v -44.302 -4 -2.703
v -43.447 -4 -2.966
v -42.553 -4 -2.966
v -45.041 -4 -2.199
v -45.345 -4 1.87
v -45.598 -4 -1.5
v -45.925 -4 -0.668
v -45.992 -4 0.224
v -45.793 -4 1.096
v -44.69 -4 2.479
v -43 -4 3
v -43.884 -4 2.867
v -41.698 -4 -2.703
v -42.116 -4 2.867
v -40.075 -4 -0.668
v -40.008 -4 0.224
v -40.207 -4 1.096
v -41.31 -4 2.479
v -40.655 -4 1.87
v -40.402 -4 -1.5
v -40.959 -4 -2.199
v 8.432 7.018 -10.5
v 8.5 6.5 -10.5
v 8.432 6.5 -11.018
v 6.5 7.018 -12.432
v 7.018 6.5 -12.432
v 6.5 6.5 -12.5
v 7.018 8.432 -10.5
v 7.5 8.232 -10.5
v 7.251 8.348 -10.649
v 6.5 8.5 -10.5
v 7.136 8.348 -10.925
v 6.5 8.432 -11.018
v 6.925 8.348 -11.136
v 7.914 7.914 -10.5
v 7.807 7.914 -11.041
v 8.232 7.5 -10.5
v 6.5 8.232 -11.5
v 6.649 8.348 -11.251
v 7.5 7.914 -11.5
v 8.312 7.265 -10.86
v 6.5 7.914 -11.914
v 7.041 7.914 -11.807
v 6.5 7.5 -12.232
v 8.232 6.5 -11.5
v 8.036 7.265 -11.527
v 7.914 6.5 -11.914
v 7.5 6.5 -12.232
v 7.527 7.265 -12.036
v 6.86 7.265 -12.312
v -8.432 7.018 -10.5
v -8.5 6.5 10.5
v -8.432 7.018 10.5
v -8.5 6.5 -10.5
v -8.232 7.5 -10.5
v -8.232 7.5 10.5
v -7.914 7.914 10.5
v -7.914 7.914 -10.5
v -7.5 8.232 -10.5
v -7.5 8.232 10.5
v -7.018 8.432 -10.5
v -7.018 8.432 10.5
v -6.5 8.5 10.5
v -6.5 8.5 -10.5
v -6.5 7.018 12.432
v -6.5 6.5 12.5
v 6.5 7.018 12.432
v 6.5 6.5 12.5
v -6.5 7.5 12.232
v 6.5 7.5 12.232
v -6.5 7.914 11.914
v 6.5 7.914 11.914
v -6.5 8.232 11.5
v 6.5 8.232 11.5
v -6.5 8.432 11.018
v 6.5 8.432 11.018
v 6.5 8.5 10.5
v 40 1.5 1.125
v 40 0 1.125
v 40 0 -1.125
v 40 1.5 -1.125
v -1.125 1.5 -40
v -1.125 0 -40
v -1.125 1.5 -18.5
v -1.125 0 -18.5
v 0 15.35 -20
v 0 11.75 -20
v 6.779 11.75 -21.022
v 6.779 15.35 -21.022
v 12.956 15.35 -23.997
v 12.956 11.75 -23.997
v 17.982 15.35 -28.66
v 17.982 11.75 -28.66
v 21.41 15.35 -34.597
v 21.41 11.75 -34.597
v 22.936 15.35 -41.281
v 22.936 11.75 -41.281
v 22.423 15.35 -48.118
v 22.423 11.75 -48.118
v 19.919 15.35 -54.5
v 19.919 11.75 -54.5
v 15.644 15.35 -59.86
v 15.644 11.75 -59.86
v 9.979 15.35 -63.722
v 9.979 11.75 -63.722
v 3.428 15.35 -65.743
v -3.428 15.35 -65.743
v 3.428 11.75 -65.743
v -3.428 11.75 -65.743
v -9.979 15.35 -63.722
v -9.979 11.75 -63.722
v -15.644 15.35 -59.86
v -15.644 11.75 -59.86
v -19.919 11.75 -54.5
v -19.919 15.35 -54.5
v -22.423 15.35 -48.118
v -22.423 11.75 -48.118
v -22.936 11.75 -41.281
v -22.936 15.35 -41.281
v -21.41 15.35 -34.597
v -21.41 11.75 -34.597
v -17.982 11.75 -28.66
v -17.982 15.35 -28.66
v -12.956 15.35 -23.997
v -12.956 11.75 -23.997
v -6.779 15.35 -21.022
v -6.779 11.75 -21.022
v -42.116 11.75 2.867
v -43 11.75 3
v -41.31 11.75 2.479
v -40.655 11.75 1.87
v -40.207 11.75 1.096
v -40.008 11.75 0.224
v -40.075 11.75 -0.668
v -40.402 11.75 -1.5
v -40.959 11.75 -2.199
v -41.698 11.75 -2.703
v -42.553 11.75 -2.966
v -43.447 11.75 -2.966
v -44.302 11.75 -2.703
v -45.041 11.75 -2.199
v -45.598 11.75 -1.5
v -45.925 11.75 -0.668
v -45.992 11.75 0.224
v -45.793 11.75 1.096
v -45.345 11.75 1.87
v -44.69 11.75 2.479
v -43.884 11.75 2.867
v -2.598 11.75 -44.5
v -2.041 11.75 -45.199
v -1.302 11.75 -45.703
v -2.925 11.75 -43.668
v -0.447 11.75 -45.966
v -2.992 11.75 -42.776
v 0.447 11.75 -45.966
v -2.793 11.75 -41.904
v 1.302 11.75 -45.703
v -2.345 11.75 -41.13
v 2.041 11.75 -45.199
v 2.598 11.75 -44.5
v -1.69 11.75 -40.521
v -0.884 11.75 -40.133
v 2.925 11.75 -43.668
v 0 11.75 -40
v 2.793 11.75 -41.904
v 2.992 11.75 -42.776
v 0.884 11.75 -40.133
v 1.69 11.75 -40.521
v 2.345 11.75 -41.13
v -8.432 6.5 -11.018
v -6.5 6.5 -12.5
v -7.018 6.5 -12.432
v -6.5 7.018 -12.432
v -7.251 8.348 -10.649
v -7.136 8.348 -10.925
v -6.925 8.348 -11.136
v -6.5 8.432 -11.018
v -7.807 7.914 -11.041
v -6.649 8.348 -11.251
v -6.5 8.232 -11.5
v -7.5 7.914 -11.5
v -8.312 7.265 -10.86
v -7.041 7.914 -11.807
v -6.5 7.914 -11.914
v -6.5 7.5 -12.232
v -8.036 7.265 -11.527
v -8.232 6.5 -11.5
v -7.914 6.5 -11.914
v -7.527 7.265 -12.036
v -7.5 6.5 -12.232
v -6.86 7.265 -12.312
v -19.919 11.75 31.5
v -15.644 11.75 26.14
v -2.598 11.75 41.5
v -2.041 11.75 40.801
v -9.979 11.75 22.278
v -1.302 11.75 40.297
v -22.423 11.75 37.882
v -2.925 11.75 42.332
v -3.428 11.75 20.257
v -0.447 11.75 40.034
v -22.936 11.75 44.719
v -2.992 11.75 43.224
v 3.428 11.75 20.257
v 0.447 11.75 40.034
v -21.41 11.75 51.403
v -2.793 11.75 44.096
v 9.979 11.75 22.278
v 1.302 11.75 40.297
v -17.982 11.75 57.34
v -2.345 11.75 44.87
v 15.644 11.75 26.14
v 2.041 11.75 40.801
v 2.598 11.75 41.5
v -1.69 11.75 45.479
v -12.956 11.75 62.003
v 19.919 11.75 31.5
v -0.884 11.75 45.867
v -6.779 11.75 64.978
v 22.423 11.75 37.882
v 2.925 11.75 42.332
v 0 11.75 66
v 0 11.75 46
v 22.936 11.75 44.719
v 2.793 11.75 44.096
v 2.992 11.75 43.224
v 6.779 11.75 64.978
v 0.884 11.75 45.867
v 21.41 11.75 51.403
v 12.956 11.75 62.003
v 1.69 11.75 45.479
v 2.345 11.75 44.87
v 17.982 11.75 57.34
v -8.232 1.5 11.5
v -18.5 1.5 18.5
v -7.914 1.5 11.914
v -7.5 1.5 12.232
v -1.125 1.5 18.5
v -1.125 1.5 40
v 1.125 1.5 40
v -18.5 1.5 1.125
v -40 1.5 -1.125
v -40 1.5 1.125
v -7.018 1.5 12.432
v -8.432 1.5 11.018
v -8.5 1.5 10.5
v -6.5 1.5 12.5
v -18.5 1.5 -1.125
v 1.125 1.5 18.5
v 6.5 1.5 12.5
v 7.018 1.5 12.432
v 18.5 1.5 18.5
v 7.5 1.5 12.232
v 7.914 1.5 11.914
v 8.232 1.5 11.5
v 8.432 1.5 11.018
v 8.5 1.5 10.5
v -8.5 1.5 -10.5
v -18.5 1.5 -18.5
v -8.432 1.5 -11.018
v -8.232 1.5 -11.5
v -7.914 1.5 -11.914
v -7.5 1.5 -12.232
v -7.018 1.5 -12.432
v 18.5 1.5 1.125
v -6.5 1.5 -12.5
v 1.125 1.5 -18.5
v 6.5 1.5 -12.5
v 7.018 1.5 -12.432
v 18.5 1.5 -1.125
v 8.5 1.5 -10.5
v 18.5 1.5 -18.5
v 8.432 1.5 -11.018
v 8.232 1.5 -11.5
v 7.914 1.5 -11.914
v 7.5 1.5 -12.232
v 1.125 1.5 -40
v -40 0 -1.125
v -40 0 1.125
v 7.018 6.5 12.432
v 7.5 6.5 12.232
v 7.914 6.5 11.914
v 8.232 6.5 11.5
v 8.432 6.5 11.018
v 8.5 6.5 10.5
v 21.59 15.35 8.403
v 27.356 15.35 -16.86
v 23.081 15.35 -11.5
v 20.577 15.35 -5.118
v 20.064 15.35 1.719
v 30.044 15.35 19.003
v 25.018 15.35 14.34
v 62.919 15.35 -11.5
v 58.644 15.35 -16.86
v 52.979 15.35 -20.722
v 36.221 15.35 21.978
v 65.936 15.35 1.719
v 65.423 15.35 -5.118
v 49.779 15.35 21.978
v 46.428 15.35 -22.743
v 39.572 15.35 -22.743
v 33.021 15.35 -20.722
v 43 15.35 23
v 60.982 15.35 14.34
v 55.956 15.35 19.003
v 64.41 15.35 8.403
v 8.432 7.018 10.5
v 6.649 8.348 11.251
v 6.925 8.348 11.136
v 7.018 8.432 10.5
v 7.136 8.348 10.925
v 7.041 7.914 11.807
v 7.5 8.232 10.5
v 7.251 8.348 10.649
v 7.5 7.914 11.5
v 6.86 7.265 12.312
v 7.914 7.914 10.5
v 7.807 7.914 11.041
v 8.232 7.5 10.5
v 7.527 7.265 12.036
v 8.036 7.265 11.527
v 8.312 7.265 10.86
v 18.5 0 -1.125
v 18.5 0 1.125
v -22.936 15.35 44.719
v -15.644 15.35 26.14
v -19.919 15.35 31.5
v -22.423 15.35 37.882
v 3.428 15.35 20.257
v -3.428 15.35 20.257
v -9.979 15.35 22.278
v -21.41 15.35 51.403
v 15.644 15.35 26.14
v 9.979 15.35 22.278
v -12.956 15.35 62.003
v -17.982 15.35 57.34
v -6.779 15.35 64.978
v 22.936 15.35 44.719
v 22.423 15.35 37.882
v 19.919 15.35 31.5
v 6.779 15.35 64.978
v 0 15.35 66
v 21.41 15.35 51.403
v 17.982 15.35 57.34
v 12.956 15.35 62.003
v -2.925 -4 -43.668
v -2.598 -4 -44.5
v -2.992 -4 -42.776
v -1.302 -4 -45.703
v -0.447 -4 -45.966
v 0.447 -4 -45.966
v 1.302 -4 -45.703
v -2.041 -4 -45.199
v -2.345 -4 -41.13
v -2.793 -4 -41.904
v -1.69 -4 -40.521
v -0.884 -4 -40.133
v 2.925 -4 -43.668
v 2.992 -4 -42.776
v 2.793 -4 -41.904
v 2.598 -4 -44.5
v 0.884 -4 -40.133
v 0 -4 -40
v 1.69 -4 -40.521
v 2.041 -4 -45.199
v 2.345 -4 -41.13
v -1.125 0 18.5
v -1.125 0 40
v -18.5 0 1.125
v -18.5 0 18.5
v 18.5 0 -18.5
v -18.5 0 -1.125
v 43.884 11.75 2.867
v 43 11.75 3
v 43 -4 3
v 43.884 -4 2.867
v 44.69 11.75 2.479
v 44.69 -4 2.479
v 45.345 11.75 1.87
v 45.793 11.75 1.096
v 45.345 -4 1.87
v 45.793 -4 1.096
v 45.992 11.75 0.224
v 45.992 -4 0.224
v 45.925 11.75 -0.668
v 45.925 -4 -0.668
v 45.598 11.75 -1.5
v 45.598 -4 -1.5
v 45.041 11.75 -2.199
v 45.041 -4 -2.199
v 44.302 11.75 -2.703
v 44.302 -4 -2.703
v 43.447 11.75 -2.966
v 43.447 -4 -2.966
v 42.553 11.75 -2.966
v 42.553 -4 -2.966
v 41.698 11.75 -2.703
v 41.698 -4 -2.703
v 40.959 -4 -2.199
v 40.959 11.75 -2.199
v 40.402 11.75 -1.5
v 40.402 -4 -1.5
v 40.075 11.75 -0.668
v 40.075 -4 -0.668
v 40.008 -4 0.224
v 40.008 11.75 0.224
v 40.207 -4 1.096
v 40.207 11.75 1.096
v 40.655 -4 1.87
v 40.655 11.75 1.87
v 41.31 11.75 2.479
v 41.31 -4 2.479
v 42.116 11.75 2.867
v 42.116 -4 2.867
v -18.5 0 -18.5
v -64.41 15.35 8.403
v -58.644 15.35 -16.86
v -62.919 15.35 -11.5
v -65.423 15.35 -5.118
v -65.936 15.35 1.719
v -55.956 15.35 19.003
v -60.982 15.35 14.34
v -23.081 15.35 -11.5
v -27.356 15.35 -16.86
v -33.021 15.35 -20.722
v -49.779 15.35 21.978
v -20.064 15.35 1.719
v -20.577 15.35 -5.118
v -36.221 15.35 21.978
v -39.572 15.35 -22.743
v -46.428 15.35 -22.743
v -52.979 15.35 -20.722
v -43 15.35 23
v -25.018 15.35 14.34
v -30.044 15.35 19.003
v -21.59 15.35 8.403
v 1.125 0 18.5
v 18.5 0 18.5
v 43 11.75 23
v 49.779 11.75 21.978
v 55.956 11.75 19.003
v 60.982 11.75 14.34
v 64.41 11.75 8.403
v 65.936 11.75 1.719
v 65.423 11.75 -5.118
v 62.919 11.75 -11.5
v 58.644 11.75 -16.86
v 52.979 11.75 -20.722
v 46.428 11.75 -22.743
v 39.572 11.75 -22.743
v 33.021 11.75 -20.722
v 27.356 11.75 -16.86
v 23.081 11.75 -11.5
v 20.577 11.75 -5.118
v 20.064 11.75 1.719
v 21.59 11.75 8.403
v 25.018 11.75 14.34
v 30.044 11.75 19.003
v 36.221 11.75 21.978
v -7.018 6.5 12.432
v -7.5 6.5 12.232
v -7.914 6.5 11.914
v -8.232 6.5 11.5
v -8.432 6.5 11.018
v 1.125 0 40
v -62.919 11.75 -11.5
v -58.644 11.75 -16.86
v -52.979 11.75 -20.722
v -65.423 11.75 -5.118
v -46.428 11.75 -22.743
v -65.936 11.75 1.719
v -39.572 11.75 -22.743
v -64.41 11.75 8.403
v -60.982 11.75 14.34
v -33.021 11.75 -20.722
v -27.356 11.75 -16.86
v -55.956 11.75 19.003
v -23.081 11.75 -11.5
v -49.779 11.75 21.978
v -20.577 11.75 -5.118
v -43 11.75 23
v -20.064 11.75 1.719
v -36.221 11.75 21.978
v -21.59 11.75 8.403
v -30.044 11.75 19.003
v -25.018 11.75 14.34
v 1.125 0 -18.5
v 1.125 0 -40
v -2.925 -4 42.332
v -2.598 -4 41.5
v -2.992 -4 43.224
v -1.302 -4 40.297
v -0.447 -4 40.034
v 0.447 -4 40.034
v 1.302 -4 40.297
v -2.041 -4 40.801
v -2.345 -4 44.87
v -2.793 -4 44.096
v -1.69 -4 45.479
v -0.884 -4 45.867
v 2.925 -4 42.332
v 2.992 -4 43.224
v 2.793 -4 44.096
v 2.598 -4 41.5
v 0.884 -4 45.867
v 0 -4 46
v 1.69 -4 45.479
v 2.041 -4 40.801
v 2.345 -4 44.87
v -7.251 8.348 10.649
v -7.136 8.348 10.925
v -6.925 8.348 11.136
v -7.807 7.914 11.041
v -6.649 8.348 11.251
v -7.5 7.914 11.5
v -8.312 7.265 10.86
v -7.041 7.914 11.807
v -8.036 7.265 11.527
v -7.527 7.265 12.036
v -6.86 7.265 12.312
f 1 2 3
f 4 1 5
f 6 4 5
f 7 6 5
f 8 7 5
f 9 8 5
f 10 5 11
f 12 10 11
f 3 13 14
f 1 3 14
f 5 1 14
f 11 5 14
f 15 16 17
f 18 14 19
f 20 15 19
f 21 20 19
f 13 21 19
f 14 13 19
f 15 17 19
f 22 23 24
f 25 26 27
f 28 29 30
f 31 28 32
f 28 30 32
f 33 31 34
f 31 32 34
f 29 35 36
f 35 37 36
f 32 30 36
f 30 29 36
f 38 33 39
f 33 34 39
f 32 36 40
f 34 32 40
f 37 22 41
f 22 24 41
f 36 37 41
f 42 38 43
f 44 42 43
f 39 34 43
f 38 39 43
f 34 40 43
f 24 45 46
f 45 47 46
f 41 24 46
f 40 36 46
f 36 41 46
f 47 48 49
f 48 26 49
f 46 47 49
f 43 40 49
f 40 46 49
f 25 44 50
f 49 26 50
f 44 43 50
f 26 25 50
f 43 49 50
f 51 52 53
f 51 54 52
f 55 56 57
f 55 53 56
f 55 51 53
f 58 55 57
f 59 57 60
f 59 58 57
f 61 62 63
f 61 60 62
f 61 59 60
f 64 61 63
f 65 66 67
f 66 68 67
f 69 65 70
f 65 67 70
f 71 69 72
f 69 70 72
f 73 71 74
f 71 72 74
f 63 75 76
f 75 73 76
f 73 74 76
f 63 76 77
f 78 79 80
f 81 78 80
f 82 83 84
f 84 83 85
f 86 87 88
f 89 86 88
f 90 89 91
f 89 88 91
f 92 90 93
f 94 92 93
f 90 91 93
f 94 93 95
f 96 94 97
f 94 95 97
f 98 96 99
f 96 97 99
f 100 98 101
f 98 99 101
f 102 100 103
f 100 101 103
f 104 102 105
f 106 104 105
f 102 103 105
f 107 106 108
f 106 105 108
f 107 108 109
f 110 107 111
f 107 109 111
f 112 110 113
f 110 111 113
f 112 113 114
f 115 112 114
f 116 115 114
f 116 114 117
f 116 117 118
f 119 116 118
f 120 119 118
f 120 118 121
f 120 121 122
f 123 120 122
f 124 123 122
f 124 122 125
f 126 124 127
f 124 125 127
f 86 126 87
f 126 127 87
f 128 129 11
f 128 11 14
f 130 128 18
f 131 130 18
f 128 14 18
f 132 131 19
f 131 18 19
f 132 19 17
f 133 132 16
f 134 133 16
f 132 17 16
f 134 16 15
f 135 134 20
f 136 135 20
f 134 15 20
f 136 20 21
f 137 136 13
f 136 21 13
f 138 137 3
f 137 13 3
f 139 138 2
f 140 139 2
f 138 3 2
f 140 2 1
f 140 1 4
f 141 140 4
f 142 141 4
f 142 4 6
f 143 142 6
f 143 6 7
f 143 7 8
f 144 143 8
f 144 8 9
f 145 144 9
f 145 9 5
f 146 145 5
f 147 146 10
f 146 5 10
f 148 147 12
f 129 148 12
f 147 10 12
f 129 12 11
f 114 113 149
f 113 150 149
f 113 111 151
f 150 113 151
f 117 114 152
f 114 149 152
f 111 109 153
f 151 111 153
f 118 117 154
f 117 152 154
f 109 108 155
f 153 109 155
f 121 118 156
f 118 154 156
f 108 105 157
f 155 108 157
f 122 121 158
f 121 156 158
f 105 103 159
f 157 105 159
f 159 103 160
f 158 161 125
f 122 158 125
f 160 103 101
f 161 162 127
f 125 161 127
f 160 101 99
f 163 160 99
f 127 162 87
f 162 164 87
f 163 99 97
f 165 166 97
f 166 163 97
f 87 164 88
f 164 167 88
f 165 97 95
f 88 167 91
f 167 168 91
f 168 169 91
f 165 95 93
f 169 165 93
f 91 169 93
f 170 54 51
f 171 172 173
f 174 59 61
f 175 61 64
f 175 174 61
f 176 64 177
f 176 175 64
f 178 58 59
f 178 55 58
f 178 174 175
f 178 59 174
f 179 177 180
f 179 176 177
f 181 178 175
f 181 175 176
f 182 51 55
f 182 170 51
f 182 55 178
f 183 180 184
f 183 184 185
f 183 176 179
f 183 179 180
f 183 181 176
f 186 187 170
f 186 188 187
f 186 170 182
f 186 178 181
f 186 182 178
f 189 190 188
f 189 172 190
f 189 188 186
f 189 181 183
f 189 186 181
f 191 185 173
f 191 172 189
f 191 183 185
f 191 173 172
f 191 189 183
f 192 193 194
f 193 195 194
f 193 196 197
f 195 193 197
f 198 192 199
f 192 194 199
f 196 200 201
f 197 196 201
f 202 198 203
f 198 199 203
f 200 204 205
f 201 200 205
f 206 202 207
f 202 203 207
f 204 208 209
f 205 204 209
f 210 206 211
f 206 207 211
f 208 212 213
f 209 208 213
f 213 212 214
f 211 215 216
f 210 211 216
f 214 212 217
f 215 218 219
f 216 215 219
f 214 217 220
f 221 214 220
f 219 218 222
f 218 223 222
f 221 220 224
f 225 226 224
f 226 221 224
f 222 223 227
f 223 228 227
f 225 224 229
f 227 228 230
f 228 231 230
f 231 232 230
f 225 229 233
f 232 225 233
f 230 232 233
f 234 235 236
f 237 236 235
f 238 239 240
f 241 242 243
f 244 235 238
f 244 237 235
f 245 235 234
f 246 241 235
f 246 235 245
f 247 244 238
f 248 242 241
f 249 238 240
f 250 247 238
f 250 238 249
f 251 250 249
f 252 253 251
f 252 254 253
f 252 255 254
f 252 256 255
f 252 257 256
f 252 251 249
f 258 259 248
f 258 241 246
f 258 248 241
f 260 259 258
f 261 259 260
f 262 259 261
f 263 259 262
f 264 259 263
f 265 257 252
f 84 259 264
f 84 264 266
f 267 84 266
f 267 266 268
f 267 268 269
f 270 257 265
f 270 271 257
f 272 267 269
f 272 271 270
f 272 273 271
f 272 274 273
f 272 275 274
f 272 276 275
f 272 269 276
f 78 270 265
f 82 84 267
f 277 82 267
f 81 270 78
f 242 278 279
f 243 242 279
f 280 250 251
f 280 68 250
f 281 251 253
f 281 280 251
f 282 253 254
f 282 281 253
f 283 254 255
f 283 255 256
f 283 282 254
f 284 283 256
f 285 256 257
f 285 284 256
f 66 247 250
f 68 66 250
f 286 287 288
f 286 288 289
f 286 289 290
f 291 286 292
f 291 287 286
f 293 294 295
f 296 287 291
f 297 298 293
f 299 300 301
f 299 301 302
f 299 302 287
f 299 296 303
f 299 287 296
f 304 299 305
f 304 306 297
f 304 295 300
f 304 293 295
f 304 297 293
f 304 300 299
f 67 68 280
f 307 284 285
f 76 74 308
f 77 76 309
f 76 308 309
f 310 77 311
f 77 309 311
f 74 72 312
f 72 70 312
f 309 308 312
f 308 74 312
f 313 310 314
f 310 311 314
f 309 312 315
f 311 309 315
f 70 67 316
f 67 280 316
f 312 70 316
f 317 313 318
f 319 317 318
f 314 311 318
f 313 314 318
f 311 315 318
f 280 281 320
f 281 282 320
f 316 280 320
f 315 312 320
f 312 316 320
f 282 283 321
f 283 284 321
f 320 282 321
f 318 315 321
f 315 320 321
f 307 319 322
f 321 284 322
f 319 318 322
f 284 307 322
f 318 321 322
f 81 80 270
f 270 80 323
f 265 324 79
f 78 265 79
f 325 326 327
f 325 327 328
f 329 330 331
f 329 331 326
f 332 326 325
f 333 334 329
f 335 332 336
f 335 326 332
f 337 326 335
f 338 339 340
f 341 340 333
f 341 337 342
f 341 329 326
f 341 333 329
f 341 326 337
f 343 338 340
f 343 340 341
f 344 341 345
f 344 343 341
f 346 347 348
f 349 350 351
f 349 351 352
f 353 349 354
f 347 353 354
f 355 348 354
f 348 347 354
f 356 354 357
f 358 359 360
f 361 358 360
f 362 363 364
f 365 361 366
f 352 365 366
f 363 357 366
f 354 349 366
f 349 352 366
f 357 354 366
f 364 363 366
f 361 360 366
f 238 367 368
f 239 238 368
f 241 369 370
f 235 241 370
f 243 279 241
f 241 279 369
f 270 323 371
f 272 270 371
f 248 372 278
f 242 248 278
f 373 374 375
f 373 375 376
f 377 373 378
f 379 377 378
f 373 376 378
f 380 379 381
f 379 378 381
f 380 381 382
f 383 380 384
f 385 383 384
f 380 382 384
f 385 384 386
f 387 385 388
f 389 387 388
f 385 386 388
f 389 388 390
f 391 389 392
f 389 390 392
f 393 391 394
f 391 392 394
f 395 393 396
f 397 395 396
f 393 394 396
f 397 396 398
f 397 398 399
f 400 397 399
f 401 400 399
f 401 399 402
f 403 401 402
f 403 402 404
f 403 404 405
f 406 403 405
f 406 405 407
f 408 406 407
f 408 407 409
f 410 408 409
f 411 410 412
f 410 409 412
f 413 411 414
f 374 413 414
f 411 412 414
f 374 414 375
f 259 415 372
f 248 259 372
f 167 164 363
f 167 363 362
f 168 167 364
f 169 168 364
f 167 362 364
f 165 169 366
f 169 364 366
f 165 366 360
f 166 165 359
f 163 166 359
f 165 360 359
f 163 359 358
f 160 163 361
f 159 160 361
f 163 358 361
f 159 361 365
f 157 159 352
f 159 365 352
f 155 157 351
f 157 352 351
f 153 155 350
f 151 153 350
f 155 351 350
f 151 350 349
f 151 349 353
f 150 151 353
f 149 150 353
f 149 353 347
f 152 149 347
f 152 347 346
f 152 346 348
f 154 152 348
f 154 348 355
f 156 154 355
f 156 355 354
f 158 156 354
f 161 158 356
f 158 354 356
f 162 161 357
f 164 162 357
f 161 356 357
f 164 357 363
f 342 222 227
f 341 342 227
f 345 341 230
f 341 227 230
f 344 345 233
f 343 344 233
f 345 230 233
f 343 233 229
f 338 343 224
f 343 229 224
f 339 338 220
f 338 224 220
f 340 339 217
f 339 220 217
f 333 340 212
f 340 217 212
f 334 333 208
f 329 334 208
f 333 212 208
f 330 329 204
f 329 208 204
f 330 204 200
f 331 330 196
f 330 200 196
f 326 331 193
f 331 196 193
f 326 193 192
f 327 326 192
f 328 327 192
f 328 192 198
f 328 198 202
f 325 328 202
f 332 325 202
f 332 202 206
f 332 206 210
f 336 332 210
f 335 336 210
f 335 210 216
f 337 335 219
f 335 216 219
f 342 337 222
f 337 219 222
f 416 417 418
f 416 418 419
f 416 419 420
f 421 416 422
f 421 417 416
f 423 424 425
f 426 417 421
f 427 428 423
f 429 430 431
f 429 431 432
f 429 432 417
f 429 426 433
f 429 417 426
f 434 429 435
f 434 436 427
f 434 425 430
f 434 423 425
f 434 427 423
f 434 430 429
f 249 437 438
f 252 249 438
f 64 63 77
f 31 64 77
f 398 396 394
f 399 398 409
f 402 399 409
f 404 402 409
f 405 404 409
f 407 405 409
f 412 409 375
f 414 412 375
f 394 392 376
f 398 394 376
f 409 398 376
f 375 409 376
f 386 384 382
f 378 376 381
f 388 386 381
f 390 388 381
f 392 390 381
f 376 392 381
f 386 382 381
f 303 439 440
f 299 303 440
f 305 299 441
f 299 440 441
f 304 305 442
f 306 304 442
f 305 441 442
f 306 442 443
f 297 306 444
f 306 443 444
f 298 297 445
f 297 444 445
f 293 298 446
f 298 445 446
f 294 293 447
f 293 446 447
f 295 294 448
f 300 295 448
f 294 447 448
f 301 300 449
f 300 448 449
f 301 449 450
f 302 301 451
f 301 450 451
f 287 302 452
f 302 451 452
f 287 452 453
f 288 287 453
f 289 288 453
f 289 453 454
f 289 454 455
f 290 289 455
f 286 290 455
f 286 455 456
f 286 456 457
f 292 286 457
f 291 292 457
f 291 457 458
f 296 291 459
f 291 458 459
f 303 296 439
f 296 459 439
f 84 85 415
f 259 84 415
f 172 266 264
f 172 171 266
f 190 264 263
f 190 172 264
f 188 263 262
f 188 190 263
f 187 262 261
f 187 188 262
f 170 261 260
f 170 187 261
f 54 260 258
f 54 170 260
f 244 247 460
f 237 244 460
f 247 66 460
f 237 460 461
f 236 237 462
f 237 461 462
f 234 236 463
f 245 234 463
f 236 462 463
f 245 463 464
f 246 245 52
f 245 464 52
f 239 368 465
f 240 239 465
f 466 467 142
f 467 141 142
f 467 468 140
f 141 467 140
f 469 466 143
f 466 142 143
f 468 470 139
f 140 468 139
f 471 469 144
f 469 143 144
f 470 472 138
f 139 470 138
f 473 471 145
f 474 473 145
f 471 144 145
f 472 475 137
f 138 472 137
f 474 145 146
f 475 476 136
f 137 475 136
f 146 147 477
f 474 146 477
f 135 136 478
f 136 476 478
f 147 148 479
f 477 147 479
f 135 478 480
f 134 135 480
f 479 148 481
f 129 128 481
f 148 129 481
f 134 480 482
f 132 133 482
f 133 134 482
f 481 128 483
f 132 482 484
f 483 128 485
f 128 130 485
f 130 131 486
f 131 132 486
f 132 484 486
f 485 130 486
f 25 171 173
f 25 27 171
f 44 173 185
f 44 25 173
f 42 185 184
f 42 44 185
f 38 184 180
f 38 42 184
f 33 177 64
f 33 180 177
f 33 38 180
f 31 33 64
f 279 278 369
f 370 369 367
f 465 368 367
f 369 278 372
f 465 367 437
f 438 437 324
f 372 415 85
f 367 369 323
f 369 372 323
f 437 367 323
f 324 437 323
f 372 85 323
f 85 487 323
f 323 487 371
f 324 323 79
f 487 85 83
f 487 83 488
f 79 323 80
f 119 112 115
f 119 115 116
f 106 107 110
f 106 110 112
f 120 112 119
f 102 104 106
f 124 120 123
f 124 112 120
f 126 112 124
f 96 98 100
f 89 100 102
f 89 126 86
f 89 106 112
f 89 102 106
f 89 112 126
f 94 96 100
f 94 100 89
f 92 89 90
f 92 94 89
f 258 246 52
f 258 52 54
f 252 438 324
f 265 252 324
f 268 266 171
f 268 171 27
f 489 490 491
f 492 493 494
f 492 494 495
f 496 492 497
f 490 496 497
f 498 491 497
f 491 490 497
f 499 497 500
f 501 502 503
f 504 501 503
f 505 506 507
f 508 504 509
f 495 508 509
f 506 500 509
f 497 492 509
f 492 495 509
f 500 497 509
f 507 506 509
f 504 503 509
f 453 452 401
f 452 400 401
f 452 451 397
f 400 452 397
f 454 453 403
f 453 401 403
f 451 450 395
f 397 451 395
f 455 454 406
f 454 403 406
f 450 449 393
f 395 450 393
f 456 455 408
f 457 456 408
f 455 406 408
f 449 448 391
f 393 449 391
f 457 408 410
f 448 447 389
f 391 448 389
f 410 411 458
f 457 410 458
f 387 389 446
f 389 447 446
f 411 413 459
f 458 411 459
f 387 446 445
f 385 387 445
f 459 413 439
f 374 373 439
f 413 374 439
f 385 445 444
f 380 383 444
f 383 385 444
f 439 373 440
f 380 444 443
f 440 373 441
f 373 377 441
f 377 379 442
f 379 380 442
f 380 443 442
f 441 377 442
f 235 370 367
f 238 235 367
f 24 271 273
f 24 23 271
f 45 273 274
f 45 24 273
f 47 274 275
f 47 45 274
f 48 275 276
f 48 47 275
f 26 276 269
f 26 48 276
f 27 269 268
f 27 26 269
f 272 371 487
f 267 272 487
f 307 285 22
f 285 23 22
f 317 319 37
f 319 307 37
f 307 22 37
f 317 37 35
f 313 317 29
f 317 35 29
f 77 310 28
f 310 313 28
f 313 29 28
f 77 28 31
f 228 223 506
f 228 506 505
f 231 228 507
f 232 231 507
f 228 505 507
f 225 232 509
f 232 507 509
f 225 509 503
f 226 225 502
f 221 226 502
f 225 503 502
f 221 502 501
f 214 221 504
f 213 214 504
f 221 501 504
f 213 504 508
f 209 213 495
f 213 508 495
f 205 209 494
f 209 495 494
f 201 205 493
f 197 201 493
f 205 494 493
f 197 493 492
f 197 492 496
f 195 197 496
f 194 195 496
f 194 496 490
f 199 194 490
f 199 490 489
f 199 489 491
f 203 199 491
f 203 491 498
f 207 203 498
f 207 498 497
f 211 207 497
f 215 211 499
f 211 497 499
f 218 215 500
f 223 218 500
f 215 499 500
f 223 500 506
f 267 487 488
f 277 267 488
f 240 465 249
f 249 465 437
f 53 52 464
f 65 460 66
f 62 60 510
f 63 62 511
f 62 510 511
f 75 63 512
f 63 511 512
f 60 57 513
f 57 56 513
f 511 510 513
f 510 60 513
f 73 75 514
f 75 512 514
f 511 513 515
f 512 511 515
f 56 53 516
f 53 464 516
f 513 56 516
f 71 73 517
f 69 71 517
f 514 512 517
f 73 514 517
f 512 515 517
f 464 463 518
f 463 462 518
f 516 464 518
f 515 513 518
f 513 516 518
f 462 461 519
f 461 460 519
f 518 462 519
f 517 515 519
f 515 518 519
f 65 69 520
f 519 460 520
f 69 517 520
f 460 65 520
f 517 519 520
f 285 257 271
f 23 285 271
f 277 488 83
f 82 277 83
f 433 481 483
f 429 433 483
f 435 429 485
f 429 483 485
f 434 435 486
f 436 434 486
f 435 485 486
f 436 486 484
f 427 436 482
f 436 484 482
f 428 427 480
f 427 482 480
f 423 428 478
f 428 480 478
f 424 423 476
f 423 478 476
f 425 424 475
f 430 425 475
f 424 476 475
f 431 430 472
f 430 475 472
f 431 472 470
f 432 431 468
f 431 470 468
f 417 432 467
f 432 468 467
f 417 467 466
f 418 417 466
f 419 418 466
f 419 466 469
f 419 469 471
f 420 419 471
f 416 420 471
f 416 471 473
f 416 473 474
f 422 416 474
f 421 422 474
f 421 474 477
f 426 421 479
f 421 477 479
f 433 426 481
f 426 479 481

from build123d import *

# Parameters (mm, degrees)
BOSS_EXTRUDE1_DEPTH        = 1.5
BOSS_EXTRUDE2_DEPTH        = 11.75
BOSS_EXTRUDE2_DEPTH_BACK   = 4
SKETCH2_R                  = 3
BOSS_EXTRUDE2_2_DEPTH      = 11.75
BOSS_EXTRUDE2_2_DEPTH_BACK = 4
BOSS_EXTRUDE2_3_DEPTH      = 11.75
BOSS_EXTRUDE2_3_DEPTH_BACK = 4
BOSS_EXTRUDE2_4_DEPTH      = 11.75
BOSS_EXTRUDE2_4_DEPTH_BACK = 4
SKETCH6_W                  = 17
SKETCH6_H                  = 25
BOSS_EXTRUDE3_DEPTH        = 7
FILLET1_R                  = 2
SKETCH9_R                  = 23
BOSS_EXTRUDE4_DEPTH        = 3.6


with BuildPart() as part:
    # Sketch1 → Boss-Extrude1 (new body)
    with BuildSketch(Plane(origin=(0, 0, 0), x_dir=(1, 0, 0), z_dir=(0, 1, 0))):
        Polygon((1.125, 18.5), (1.125, 40), (-1.125, 40), (-1.125, 18.5), (-18.5, 18.5), (-18.5, 1.125), (-40, 1.125), (-40, -1.125), (-18.5, -1.125), (-18.5, -18.5), (-1.125, -18.5), (-1.125, -40), (1.125, -40), (1.125, -18.5), (18.5, -18.5), (18.5, -1.125), (40, -1.125), (40, 1.125), (18.5, 1.125), (18.5, 18.5), align=None)
    extrude(amount=BOSS_EXTRUDE1_DEPTH)

    # Sketch6 → Boss-Extrude3 (add)
    with BuildSketch(Plane(origin=(0, 1.5, 0), x_dir=(1, 0, 0), z_dir=(0, 1, 0))):
        Rectangle(SKETCH6_W, SKETCH6_H)
    extrude(amount=BOSS_EXTRUDE3_DEPTH)

    # Fillet1
    fillet1_edges = [part.edges().sort_by_distance(p)[0] for p in [
        (-8.5, 5, -12.5),
        (-8.5, 5, 12.5),
        (8.5, 5, 12.5),
        (8.5, 5, -12.5),
        (-8.5, 8.5, 0),
        (0, 8.5, 12.5),
        (8.5, 8.5, 0),
        (0, 8.5, -12.5),
    ]]
    fillet(fillet1_edges, radius=FILLET1_R)


with BuildPart() as body_2:
    # Sketch2 → Boss-Extrude2 (new, two sides: drawn at the far end of the back side and taken through both)
    with BuildSketch(Plane(origin=(0, 0, 0), x_dir=(1, 0, 0), z_dir=(0, 1, 0)).offset(-BOSS_EXTRUDE2_DEPTH_BACK)):
        with Locations(Location((0, 43, 0), (0, 0, 270))):
            Circle(SKETCH2_R)
    extrude(amount=BOSS_EXTRUDE2_DEPTH + BOSS_EXTRUDE2_DEPTH_BACK)



with BuildPart() as body_3:
    # Sketch2 → Boss-Extrude2 2 (new, two sides: drawn at the far end of the back side and taken through both)
    with BuildSketch(Plane(origin=(0, 0, 0), x_dir=(1, 0, 0), z_dir=(0, 1, 0)).offset(-BOSS_EXTRUDE2_2_DEPTH_BACK)):
        with Locations(Location((43, 0, 0), (0, 0, 270))):
            Circle(SKETCH2_R)
    extrude(amount=BOSS_EXTRUDE2_2_DEPTH + BOSS_EXTRUDE2_2_DEPTH_BACK)


with BuildPart() as body_4:
    # Sketch2 → Boss-Extrude2 3 (new, two sides: drawn at the far end of the back side and taken through both)
    with BuildSketch(Plane(origin=(0, 0, 0), x_dir=(1, 0, 0), z_dir=(0, 1, 0)).offset(-BOSS_EXTRUDE2_3_DEPTH_BACK)):
        with Locations(Location((0, -43, 0), (0, 0, 270))):
            Circle(SKETCH2_R)
    extrude(amount=BOSS_EXTRUDE2_3_DEPTH + BOSS_EXTRUDE2_3_DEPTH_BACK)


with BuildPart() as body_5:
    # Sketch2 → Boss-Extrude2 4 (new, two sides: drawn at the far end of the back side and taken through both)
    with BuildSketch(Plane(origin=(0, 0, 0), x_dir=(1, 0, 0), z_dir=(0, 1, 0)).offset(-BOSS_EXTRUDE2_4_DEPTH_BACK)):
        with Locations(Location((-43, 0, 0), (0, 0, 270))):
            Circle(SKETCH2_R)
    extrude(amount=BOSS_EXTRUDE2_4_DEPTH + BOSS_EXTRUDE2_4_DEPTH_BACK)


with BuildPart() as body_2_1:
    add(body_2.part)

    add(body_3.part)  # Boss-Extrude4 merges body 3

    add(body_4.part)  # Boss-Extrude4 merges body 4

    add(body_5.part)  # Boss-Extrude4 merges body 5
    # Sketch9 → Boss-Extrude4 (add)
    with BuildSketch(Plane(origin=(0, 11.75, 0), x_dir=(1, 0, 0), z_dir=(0, 1, 0))):
        with Locations(Location((0, 43, 0), (0, 0, 270))):
            Circle(SKETCH9_R)
        with Locations(Location((43, 0, 0), (0, 0, 270))):
            Circle(SKETCH9_R)
        with Locations(Location((0, -43, 0), (0, 0, 270))):
            Circle(SKETCH9_R)
        with Locations(Location((-43, 0, 0), (0, 0, 270))):
            Circle(SKETCH9_R)
    extrude(amount=BOSS_EXTRUDE4_DEPTH)


solid = Compound([part.part, body_2_1.part])
